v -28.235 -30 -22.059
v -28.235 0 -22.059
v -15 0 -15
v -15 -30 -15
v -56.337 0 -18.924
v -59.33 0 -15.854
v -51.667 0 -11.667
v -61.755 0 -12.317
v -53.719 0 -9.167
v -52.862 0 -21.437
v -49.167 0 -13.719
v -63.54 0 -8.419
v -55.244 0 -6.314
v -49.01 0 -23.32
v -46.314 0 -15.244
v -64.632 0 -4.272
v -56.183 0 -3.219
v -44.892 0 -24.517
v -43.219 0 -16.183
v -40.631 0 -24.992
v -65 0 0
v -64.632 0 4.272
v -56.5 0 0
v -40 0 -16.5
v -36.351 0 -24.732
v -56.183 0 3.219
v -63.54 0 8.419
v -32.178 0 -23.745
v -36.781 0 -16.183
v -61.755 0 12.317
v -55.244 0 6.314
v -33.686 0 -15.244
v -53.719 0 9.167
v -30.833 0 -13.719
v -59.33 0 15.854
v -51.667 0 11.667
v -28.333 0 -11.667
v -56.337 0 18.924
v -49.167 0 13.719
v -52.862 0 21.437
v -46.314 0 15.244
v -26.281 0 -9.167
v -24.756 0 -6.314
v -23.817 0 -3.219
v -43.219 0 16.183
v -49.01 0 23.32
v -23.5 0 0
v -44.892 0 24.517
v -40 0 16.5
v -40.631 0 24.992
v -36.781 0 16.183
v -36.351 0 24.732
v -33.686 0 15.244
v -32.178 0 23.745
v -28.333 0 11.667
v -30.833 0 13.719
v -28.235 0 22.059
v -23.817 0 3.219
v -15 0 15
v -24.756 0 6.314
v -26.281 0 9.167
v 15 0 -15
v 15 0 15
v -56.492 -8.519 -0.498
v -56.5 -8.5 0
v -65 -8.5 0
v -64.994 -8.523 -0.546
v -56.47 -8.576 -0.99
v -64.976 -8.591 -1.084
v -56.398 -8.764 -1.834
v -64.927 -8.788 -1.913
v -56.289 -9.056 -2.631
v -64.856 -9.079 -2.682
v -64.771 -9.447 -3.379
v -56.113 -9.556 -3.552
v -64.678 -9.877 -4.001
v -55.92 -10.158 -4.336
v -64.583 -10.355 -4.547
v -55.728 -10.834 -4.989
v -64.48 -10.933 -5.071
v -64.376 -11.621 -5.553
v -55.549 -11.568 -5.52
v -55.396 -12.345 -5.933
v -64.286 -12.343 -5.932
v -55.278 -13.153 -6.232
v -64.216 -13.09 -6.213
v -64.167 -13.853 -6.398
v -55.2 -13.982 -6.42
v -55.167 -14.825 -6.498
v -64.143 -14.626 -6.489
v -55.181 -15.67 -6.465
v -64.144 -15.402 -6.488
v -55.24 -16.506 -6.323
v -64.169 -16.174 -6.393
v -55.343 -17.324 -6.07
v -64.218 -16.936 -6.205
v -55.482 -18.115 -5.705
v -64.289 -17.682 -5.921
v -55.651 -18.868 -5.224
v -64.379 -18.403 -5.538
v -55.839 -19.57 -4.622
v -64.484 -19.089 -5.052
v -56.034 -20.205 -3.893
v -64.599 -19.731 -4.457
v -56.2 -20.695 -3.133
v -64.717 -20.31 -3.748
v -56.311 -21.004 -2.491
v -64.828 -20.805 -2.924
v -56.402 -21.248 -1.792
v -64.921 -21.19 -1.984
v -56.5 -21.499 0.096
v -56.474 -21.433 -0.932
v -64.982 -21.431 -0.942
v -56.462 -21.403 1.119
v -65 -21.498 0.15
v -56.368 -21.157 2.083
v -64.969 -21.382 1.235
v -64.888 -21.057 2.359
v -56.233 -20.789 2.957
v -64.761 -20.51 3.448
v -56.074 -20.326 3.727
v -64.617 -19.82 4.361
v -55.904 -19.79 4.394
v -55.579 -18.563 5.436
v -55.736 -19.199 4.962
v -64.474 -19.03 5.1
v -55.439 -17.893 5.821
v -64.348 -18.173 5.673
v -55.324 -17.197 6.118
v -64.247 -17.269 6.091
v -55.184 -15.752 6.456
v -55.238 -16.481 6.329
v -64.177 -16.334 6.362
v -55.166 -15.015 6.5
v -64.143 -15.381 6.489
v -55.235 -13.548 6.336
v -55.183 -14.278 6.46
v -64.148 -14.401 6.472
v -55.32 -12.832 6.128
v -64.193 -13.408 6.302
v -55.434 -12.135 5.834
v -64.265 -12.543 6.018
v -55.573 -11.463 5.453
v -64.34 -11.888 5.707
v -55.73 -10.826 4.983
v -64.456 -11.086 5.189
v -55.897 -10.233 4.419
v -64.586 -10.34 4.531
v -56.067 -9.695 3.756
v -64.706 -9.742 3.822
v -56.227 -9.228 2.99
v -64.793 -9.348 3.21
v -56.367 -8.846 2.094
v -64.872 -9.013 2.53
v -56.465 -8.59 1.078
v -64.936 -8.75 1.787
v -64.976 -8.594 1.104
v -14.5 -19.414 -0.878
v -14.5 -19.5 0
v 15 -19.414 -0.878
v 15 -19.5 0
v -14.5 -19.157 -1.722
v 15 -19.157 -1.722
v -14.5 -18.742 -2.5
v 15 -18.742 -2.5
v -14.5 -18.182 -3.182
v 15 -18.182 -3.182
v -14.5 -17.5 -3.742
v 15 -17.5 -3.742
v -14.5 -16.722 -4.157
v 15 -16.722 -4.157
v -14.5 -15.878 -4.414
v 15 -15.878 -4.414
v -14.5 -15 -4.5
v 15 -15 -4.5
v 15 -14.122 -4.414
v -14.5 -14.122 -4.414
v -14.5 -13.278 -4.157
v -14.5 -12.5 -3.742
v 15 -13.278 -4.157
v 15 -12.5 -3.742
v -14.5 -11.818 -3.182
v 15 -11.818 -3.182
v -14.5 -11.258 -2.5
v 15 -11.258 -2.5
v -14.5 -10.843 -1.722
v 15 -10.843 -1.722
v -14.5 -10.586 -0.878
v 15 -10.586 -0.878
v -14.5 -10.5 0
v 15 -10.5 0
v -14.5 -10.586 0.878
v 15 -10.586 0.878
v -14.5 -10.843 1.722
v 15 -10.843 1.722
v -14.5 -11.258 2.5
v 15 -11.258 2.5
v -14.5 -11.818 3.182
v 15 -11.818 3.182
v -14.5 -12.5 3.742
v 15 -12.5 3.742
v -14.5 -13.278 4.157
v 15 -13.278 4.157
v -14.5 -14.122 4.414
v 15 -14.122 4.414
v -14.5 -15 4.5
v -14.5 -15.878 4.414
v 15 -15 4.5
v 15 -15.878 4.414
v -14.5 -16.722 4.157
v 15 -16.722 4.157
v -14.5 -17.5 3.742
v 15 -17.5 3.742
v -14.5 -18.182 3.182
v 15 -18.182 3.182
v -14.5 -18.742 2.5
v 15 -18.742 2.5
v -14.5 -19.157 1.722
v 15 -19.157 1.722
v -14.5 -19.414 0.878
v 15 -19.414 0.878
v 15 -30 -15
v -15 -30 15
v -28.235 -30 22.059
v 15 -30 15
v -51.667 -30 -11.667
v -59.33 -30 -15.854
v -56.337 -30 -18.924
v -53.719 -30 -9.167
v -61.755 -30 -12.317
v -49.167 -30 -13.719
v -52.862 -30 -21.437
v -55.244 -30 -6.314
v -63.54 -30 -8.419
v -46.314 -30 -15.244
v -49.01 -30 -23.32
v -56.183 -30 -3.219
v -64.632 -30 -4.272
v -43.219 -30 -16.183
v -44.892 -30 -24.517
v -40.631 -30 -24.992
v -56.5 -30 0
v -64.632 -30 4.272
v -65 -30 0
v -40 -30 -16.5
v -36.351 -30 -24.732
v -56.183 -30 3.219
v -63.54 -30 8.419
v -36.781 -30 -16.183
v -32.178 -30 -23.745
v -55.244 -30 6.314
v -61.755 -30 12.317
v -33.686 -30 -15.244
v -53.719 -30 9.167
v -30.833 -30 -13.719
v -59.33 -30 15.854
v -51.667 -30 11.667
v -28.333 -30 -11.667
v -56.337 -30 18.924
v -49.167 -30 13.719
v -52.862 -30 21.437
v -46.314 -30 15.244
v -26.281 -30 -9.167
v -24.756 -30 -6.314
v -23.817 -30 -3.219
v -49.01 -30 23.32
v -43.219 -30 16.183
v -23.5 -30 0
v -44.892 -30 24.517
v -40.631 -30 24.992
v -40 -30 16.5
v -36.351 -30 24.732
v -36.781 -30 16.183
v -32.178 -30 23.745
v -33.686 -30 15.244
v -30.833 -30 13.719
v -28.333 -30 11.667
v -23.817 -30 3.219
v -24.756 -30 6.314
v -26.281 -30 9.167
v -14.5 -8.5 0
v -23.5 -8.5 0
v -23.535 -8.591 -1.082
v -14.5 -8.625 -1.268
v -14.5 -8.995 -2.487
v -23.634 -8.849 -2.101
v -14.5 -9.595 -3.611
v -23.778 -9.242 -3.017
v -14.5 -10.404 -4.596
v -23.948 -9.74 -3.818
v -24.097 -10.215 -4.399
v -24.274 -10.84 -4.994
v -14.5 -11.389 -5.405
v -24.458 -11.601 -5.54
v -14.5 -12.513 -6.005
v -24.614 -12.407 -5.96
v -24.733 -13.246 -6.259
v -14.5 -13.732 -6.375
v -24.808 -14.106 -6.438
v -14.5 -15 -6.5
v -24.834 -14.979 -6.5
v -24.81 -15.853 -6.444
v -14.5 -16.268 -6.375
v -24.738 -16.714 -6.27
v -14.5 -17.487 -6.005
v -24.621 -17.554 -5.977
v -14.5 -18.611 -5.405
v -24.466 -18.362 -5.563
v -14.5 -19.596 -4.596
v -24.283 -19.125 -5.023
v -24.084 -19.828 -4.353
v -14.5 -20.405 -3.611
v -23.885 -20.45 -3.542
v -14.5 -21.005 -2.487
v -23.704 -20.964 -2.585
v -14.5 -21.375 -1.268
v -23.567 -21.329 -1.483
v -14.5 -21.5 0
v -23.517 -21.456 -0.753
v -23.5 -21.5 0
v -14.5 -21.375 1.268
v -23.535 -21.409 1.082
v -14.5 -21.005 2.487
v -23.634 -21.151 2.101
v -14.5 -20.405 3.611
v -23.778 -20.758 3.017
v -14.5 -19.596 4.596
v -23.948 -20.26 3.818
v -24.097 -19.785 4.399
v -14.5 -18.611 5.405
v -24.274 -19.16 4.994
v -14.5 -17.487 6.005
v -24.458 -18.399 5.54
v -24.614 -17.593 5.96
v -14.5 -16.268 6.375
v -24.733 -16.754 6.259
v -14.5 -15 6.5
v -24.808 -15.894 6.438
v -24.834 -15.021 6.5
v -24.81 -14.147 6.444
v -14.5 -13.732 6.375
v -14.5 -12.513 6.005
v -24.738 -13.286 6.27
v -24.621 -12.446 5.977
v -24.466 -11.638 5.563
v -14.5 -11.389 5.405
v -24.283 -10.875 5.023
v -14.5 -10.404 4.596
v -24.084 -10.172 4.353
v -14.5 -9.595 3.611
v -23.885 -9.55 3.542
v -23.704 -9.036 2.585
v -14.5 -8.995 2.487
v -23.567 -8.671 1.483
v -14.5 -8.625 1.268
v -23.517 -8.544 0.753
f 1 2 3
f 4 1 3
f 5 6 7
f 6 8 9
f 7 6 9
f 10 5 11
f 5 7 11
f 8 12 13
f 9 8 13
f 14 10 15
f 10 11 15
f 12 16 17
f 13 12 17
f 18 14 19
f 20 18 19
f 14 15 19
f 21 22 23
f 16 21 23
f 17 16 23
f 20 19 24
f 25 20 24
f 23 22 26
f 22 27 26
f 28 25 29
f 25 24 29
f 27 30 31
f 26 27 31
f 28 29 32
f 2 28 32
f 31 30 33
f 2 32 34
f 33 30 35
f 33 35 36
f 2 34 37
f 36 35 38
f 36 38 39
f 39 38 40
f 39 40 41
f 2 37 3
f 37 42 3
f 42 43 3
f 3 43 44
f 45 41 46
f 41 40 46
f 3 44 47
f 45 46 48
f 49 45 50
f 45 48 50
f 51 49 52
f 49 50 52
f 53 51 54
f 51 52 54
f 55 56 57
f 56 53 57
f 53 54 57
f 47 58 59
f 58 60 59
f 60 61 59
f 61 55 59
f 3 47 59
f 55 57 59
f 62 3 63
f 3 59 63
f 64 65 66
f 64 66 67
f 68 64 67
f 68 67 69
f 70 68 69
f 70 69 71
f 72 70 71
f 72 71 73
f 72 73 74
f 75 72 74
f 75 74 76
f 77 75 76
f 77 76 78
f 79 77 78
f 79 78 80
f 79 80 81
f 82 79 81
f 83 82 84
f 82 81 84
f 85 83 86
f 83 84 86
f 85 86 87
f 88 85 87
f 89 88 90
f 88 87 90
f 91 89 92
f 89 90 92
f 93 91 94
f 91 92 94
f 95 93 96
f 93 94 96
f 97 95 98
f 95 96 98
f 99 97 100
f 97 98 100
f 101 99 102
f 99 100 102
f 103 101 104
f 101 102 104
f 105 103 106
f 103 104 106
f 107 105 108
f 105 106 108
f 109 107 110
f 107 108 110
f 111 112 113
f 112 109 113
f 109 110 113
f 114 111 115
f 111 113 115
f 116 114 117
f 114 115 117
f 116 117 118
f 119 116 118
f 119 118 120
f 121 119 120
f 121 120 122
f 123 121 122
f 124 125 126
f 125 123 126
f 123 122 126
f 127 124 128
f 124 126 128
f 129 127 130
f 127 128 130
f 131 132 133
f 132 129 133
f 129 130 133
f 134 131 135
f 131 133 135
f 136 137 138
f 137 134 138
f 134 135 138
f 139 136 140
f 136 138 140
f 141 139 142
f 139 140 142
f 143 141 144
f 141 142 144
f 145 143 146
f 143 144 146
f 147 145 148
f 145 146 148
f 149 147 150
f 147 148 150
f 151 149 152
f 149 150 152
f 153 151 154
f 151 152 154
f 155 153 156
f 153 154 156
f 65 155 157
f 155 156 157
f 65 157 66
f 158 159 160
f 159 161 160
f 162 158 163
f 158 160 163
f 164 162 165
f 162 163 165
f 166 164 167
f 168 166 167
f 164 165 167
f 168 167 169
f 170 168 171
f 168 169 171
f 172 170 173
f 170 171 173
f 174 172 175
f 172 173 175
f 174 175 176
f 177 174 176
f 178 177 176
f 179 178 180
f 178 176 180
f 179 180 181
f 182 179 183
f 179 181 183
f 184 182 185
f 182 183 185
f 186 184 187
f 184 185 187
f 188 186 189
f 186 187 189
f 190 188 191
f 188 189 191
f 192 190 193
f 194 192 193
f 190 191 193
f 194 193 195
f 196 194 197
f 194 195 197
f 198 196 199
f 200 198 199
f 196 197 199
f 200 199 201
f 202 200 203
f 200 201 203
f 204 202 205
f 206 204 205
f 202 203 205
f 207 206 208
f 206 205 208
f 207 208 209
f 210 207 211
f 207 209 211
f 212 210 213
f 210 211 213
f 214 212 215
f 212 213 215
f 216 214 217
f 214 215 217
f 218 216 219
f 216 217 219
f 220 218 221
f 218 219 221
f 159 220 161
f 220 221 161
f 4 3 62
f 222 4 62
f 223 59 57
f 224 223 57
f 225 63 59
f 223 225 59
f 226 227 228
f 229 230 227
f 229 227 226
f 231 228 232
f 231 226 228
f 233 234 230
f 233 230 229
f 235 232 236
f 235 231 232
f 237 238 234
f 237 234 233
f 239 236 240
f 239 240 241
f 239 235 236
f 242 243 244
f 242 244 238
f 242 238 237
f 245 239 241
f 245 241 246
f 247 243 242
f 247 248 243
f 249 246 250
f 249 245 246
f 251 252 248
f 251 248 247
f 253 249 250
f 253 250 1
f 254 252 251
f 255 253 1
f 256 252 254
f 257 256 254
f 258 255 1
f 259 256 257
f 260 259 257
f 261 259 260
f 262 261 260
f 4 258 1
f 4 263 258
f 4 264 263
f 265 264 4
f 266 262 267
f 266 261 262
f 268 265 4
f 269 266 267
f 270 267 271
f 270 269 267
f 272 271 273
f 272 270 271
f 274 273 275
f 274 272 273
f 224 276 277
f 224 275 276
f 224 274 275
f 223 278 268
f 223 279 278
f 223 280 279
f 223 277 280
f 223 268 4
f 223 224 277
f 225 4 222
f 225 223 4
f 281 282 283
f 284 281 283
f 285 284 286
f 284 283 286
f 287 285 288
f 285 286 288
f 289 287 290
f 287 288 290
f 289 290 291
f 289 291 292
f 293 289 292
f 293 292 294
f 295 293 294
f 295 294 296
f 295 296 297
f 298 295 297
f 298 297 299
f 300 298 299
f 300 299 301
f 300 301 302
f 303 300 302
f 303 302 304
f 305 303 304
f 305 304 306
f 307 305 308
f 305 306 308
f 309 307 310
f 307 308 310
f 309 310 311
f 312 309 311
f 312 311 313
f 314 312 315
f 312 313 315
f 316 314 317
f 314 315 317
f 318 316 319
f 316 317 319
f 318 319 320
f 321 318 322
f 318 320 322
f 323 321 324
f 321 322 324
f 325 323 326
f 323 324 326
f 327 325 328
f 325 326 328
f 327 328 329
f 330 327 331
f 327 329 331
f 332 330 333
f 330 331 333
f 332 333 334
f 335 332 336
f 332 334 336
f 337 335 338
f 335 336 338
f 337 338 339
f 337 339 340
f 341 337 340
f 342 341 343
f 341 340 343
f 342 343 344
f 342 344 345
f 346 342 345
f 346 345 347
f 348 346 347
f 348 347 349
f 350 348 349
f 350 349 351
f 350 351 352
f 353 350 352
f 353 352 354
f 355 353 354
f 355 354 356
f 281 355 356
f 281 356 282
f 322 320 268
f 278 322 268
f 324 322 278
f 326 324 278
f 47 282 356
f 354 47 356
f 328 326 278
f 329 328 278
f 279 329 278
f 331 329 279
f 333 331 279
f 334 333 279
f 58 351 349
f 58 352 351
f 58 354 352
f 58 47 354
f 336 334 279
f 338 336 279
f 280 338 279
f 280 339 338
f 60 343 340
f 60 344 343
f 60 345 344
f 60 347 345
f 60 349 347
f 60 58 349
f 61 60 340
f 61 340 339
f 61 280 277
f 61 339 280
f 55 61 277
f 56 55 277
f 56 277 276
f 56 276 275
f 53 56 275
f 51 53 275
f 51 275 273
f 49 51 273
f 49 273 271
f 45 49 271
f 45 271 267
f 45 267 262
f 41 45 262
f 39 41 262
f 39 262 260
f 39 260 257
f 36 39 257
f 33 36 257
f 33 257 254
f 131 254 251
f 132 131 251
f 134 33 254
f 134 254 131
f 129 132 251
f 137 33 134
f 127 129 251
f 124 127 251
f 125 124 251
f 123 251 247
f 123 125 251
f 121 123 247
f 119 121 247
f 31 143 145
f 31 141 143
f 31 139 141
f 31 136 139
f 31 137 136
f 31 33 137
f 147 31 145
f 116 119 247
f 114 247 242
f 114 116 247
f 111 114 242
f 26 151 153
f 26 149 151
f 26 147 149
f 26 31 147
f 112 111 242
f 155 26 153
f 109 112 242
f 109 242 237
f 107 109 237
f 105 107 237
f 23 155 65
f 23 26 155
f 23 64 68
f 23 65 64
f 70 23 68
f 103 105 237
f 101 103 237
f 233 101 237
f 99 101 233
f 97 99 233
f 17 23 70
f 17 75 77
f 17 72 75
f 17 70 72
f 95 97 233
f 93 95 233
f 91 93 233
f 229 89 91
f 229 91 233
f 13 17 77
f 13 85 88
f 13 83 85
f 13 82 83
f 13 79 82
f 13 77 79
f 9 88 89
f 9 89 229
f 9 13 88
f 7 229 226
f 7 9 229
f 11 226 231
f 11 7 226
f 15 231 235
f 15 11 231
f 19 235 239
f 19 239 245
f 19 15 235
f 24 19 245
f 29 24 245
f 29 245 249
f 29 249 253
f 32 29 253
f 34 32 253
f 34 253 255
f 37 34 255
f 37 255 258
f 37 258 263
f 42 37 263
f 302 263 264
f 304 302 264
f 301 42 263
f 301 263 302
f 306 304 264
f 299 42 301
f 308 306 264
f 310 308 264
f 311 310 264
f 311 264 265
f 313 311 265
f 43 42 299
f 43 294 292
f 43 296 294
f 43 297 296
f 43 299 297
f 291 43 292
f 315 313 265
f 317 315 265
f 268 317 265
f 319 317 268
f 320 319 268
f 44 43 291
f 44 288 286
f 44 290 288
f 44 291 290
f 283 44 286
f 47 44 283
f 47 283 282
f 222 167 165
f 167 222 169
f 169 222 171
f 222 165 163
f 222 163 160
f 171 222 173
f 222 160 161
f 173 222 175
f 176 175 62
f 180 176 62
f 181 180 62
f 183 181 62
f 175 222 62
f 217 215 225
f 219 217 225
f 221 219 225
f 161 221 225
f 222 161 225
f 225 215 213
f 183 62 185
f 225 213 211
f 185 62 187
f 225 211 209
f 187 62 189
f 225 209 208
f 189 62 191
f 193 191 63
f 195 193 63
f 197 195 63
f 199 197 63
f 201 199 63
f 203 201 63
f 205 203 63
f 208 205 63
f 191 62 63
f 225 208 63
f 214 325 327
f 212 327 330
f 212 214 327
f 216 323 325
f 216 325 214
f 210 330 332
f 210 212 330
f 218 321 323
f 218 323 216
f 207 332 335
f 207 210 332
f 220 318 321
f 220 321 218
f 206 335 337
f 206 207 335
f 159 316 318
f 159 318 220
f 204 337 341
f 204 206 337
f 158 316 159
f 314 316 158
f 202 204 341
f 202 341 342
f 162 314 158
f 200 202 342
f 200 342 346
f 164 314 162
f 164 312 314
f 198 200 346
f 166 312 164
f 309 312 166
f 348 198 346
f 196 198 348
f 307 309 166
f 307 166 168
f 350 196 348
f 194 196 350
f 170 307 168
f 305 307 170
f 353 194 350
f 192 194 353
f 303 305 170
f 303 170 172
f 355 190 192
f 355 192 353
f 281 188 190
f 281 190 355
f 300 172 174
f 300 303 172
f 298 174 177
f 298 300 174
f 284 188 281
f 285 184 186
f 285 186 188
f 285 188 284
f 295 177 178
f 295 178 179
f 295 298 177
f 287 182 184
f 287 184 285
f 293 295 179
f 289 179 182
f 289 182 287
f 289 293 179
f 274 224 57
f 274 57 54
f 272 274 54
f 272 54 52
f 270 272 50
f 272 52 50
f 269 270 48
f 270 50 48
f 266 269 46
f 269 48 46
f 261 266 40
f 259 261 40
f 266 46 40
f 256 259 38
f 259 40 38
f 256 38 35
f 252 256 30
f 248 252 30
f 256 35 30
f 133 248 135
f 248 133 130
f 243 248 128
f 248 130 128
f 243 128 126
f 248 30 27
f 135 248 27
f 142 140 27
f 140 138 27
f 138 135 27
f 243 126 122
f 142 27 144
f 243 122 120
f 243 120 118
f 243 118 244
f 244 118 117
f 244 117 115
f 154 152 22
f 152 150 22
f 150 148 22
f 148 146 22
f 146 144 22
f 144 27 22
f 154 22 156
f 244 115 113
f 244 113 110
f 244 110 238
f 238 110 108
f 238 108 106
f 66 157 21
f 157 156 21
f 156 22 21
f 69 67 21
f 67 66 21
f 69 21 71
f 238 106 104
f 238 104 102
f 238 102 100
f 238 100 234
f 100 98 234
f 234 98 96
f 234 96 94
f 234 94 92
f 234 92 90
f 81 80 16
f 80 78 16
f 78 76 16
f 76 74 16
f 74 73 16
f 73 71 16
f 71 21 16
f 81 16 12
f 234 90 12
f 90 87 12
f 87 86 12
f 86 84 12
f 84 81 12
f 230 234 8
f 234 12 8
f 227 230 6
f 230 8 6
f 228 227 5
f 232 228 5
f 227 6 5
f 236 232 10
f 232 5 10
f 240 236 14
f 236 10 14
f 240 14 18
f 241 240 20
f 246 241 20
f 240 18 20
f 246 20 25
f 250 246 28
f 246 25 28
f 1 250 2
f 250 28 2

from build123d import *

# Parameters (mm, degrees)
F0_R           = 16.5
F1_DEPTH       = 30
F5_D           = 9
F5_START       = 1.5000001
F5_CBORE_D     = 13
F5_CBORE_DEPTH = 9
F8_D           = 13
F8_DEPTH       = 20
F8_START       = 0.8597847
F8_TIP         = 3.9055940237


with BuildPart() as f1:
    # F0 (on Front) → F1 (new body)
    with BuildSketch(Plane.XZ):
        with BuildLine():
            ThreePointArc((-28.2352941176, -22.0588235294), (-18.5626768572, -12.8623938857), (-15, 0))
            ThreePointArc((-15, 0), (-18.5626768572, 12.8623938857), (-28.2352941176, 22.0588235294))
            ThreePointArc((-28.2352941176, 22.0588235294), (-65, 0), (-28.2352941176, -22.0588235294))
        make_face()
        with Locations((-40, 0)):
            Circle(F0_R, mode=Mode.SUBTRACT)
        with BuildLine():
            ThreePointArc((-28.2352941176, 22.0588235294), (-18.5626768572, 12.8623938857), (-15, 0))
            Line((-15, 0), (-15, 15))
            Line((-15, 15), (-28.2352941176, 22.0588235294))
        make_face()
        with BuildLine():
            Line((-28.2352941176, -22.0588235294), (-15, -15))
            Line((-15, -15), (-15, 0))
            ThreePointArc((-15, 0), (-18.5626768572, -12.8623938857), (-28.2352941176, -22.0588235294))
        make_face()
        Polygon((-15, -15), (15, -15), (15, 15), (-15, 15), (-15, 0), align=None)
    extrude(amount=F1_DEPTH)

    # F5 (through all)
    # its depths count from where the whole tool has entered the part; down to there all is cleared
    with Locations(Plane(origin=(-25, 0, 0), x_dir=(0, 1, 0), z_dir=(-1, 0, 0)).offset(-F5_START)):
        with Locations((-15, 0)):
            CounterBoreHole(F5_D / 2, F5_CBORE_D / 2, F5_CBORE_DEPTH)

    # F8
    # its depths count from where the whole tool has entered the part; down to there all is cleared
    with Locations(Plane(origin=(-65, 0, 0), x_dir=(0, 1, 0), z_dir=(-1, 0, 0)).offset(-F8_START)):
        with Locations((-15, 0)):
            Hole(F8_D / 2, depth=F8_DEPTH)
            with Locations((0, 0, -(F8_DEPTH + F8_TIP / 2))):  # 118° drill point
                Cone(0, F8_D / 2, F8_TIP, mode=Mode.SUBTRACT)


solid = f1.part
